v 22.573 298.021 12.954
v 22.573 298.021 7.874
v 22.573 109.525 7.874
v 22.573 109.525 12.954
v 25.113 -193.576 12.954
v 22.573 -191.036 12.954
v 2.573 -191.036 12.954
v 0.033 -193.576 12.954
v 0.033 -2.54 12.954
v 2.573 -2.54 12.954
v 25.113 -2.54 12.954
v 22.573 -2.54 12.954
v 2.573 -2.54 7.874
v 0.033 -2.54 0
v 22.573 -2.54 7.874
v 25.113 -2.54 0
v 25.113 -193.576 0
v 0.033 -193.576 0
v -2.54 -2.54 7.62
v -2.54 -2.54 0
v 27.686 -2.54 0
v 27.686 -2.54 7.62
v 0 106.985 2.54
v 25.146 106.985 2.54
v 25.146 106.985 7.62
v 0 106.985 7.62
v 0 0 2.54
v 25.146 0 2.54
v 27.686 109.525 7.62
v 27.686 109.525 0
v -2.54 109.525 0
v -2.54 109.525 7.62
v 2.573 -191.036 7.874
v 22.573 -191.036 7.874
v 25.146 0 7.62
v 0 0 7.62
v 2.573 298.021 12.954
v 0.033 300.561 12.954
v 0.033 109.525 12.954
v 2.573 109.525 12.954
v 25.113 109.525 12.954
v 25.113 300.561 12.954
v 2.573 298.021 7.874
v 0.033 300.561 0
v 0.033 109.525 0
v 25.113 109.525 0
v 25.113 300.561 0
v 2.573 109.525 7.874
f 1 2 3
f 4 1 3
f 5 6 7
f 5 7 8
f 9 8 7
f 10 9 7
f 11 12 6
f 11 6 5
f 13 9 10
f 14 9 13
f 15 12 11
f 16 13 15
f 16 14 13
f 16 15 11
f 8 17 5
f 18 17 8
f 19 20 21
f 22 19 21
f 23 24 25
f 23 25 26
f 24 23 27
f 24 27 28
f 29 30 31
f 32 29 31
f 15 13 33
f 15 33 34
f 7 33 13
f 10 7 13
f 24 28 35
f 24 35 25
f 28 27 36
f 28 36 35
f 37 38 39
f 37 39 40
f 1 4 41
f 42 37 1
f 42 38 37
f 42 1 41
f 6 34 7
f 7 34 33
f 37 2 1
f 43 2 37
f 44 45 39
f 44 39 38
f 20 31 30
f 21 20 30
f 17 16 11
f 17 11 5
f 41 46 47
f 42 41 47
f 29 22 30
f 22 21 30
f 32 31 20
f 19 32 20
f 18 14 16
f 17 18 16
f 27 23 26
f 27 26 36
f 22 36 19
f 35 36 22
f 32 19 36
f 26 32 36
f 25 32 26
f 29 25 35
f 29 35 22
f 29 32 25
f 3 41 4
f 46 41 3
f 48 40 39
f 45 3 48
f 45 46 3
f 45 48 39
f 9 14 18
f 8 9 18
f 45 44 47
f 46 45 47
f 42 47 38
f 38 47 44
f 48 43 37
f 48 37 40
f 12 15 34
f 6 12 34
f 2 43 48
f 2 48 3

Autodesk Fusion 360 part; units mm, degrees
sketch "Sketch2" plane through (0, 0, 0) normal (0, 0, 1) x (1, 0, 0)
  line L0 (0, 0) -> (25.146, 0)
  line L1 (25.146, 0) -> (25.146, 106.9848)
  line L2 (25.146, 106.9848) -> (0, 106.9848)
  line L3 (0, 106.9848) -> (0, 0)
  line L4 (0, 106.9848) -> (-2.54, 106.9848)
  line L5 (-2.54, 106.9848) -> (-2.54, 0)
  line L6 (-2.54, 0) -> (0, 0)
  line L7 (0, 0) -> (0, 106.9848)
  line L8 (25.146, 0) -> (27.686, 0)
  line L9 (27.686, 0) -> (27.686, 106.9848)
  line L10 (27.686, 106.9848) -> (25.146, 106.9848)
  line L11 (25.146, 106.9848) -> (25.146, 0)
  line L12 (71.12, 68.58) -> (71.12, 66.04)
  line L13 (-2.54, 104.4448) -> (-2.54, 106.9848)
  line L14 (-2.54, 106.9848) -> (27.686, 106.9848)
  line L15 (27.686, 106.9848) -> (27.686, 109.5248)
  line L16 (27.686, 109.5248) -> (-2.54, 109.5248)
  line L17 (-2.54, 109.5248) -> (-2.54, 106.9848)
  line L18 (27.686, 0) -> (-2.54, 0)
  line L19 (-2.54, 0) -> (-2.54, -2.54)
  line L20 (-2.54, -2.54) -> (27.686, -2.54)
  line L21 (27.686, -2.54) -> (27.686, 0)
  dimension "d46" = 25.146
  dimension "d47" = 106.9848
  dimension "d48" = 2.54
  dimension "d49" = 2.54
  dimension "d51" = 2.54
  dimension "d52" = 2.54
  dimension "d53" = 30.226
  dimension "d54" = 2.54
  dimension "d55" = 30.226
  dimension "d96" = 106.9848
extrude "Extrude10" add sketch "Sketch2" along normal blind 2.54 contours L0 L1 L2 L3 L7 L11 L14 L18 makes body 1
extrude "Extrude11" add sketch "Sketch2" along normal blind 7.62 contours L1 L8 L9 L10 L11 L14 L18 bodies 1
extrude "Extrude12" add sketch "Sketch2" along normal blind 7.62 contours L0 L6 L8 L18 L19 L20 L21 bodies 1
extrude "Extrude13" add sketch "Sketch2" along normal blind 7.62 contours L3 L4 L5 L6 L7 L13 L14 L18 bodies 1
extrude "Extrude14" add sketch "Sketch2" along normal blind 7.62 contours L2 L4 L10 L14 L15 L16 L17 bodies 1
sketch "Sketch3" plane through (0, 0, 0) normal (0, 0, 1) x (1, 0, 0)
  line L0 (2.573, -2.54) -> (22.573, -2.54)
  line L1 (22.573, -2.54) -> (22.573, -191.036)
  line L2 (22.573, -191.036) -> (2.573, -191.036)
  line L3 (2.573, -191.036) -> (2.573, -2.54)
  line L4 (-2.54, -2.54) -> (27.686, -2.54)
  line L5 (27.686, -2.54) -> (27.686, 6.5024) construction
  line L6 (-2.54, -2.54) -> (-2.54, 5.6707) construction
  line L7 (2.573, -2.54) -> (0.033, -2.54) construction
  line L8 (0.033, -191.036) -> (2.573, -191.036) construction
  line L9 (2.573, -2.54) -> (0.033, -2.54)
  line L10 (0.033, -2.54) -> (0.033, -191.036)
  line L11 (0.033, -191.036) -> (2.573, -191.036)
  line L12 (2.573, -191.036) -> (2.573, -2.54)
  line L13 (22.573, -2.54) -> (25.113, -2.54)
  line L14 (25.113, -2.54) -> (25.113, -191.036)
  line L15 (25.113, -191.036) -> (22.573, -191.036)
  line L16 (22.573, -191.036) -> (22.573, -2.54)
  line L17 (0.033, -191.036) -> (25.113, -191.036)
  line L18 (25.113, -191.036) -> (25.113, -193.576)
  line L19 (25.113, -193.576) -> (0.033, -193.576)
  line L20 (0.033, -193.576) -> (0.033, -191.036)
  line L21 (-2.54, 106.9848) -> (-2.54, 0)
  line L22 (-2.54, 53.4924) -> (30.48, 53.4924)
  line L23 (25.113, 109.5248) -> (25.113, 298.0208)
  line L24 (22.573, 298.0208) -> (22.573, 109.5248)
  line L25 (2.573, 298.0208) -> (2.573, 109.5248)
  line L26 (0.033, 109.5248) -> (0.033, 298.0208)
  line L27 (2.573, 109.5248) -> (22.573, 109.5248)
  line L28 (2.573, 109.5248) -> (0.033, 109.5248)
  line L29 (22.573, 109.5248) -> (25.113, 109.5248)
  line L30 (27.686, 109.5248) -> (27.686, 100.4824) construction
  line L31 (-2.54, 109.5248) -> (-2.54, 101.3141) construction
  line L32 (25.113, 300.5608) -> (0.033, 300.5608)
  line L33 (0.033, 298.0208) -> (2.573, 298.0208)
  line L34 (22.573, 298.0208) -> (2.573, 298.0208)
  line L35 (25.113, 298.0208) -> (22.573, 298.0208)
  line L36 (25.113, 298.0208) -> (25.113, 300.5608)
  line L37 (0.033, 300.5608) -> (0.033, 298.0208)
  dimension "d66" = 188.496
  dimension "d67" = 20
  dimension "d68" = 5.113
  dimension "d69" = 5.113
  dimension "d71" = 188.496
  dimension "d72" = 2.54
  dimension "d73" = 188.496
  dimension "d74" = 2.54
  dimension "d75" = 188.496
  dimension "d76" = 25.08
  dimension "d77" = 2.54
extrude "Extrude15" add sketch "Sketch3" along normal blind 7.874 separate body contours L0 L1 L2 L3 L4 L12 L16 L17 makes body 2
extrude "Extrude16" add sketch "Sketch3" along normal blind 12.954 separate body contours L1 L4 L13 L14 L15 L16 L17 makes body 3
extrude "Extrude17" add sketch "Sketch3" along normal blind 12.954 separate body contours L3 L4 L9 L10 L11 L12 L17 makes body 4
extrude "Extrude18" add sketch "Sketch3" along normal blind 12.954 separate body contours L2 L11 L15 L17 L18 L19 L20 makes body 5
combine "Combine1" operation add target body 2 tool bodies 5 4 3
extrude "Extrude19" add sketch "Sketch3" along normal blind 7.874 separate body contours L24 L25 L27 L34 makes body 6
extrude "Extrude20" add sketch "Sketch3" along normal blind 12.954 separate body contours L23 L24 L29 L35 makes body 7
extrude "Extrude21" add sketch "Sketch3" along normal blind 12.954 separate body contours L32 L33 L34 L35 L36 L37 makes body 8
extrude "Extrude22" add sketch "Sketch3" along normal blind 12.954 separate body contours L25 L26 L28 L33 makes body 9
combine "Combine2" operation add target body 9 tool bodies 7 6 8
equation "ReaderDepth = 0.9 in"
equation "ReaderWidth = 1.3 in"
equation "Width = ( ReaderWidth * 3 ) * 1.08"
equation "Depth = ReaderDepth * 1.1"
equation "WallWidth = 0.1 in"
equation "BitHeight = 0.6 in"
equation "Height = 0.1 in"
equation "WallHeight = ( BitHeight / 3 ) + Height"
equation "RackLength = 188.496 mm"
equation "RackWidth = 20 mm"
equation "d46 = Depth"
equation "d47 = Width"
equation "d48 = WallWidth"
equation "d49 = WallWidth"
equation "d51 = WallWidth"
equation "d52 = WallWidth"
equation "d53 = Depth + ( 2 * WallWidth )"
equation "d54 = WallWidth"
equation "d55 = Depth + ( 2 * WallWidth )"
equation "d56 = Height"
equation "d58 = WallHeight"
equation "d60 = WallHeight"
equation "d62 = WallHeight"
equation "d64 = WallHeight"
equation "d66 = RackLength"
equation "d67 = RackWidth"
equation "d68 = d69"
equation "d71 = RackLength"
equation "d72 = WallWidth"
equation "d73 = RackLength"
equation "d74 = WallWidth"
equation "d75 = RackLength"
equation "d76 = RackWidth + ( 2 * WallWidth )"
equation "d77 = WallWidth"
equation "RackHolderHeight = 0.31 in"
equation "RackHolderWalls = RackHolderHeight + ( WallHeight - Height )"
equation "d80 = RackHolderHeight"
equation "d82 = RackHolderWalls"
equation "d84 = RackHolderWalls"
equation "d86 = RackHolderWalls"
equation "d88 = RackHolderHeight"
equation "d90 = RackHolderWalls"
equation "d92 = RackHolderWalls"
equation "d94 = RackHolderWalls"
equation "d96 = Width"
